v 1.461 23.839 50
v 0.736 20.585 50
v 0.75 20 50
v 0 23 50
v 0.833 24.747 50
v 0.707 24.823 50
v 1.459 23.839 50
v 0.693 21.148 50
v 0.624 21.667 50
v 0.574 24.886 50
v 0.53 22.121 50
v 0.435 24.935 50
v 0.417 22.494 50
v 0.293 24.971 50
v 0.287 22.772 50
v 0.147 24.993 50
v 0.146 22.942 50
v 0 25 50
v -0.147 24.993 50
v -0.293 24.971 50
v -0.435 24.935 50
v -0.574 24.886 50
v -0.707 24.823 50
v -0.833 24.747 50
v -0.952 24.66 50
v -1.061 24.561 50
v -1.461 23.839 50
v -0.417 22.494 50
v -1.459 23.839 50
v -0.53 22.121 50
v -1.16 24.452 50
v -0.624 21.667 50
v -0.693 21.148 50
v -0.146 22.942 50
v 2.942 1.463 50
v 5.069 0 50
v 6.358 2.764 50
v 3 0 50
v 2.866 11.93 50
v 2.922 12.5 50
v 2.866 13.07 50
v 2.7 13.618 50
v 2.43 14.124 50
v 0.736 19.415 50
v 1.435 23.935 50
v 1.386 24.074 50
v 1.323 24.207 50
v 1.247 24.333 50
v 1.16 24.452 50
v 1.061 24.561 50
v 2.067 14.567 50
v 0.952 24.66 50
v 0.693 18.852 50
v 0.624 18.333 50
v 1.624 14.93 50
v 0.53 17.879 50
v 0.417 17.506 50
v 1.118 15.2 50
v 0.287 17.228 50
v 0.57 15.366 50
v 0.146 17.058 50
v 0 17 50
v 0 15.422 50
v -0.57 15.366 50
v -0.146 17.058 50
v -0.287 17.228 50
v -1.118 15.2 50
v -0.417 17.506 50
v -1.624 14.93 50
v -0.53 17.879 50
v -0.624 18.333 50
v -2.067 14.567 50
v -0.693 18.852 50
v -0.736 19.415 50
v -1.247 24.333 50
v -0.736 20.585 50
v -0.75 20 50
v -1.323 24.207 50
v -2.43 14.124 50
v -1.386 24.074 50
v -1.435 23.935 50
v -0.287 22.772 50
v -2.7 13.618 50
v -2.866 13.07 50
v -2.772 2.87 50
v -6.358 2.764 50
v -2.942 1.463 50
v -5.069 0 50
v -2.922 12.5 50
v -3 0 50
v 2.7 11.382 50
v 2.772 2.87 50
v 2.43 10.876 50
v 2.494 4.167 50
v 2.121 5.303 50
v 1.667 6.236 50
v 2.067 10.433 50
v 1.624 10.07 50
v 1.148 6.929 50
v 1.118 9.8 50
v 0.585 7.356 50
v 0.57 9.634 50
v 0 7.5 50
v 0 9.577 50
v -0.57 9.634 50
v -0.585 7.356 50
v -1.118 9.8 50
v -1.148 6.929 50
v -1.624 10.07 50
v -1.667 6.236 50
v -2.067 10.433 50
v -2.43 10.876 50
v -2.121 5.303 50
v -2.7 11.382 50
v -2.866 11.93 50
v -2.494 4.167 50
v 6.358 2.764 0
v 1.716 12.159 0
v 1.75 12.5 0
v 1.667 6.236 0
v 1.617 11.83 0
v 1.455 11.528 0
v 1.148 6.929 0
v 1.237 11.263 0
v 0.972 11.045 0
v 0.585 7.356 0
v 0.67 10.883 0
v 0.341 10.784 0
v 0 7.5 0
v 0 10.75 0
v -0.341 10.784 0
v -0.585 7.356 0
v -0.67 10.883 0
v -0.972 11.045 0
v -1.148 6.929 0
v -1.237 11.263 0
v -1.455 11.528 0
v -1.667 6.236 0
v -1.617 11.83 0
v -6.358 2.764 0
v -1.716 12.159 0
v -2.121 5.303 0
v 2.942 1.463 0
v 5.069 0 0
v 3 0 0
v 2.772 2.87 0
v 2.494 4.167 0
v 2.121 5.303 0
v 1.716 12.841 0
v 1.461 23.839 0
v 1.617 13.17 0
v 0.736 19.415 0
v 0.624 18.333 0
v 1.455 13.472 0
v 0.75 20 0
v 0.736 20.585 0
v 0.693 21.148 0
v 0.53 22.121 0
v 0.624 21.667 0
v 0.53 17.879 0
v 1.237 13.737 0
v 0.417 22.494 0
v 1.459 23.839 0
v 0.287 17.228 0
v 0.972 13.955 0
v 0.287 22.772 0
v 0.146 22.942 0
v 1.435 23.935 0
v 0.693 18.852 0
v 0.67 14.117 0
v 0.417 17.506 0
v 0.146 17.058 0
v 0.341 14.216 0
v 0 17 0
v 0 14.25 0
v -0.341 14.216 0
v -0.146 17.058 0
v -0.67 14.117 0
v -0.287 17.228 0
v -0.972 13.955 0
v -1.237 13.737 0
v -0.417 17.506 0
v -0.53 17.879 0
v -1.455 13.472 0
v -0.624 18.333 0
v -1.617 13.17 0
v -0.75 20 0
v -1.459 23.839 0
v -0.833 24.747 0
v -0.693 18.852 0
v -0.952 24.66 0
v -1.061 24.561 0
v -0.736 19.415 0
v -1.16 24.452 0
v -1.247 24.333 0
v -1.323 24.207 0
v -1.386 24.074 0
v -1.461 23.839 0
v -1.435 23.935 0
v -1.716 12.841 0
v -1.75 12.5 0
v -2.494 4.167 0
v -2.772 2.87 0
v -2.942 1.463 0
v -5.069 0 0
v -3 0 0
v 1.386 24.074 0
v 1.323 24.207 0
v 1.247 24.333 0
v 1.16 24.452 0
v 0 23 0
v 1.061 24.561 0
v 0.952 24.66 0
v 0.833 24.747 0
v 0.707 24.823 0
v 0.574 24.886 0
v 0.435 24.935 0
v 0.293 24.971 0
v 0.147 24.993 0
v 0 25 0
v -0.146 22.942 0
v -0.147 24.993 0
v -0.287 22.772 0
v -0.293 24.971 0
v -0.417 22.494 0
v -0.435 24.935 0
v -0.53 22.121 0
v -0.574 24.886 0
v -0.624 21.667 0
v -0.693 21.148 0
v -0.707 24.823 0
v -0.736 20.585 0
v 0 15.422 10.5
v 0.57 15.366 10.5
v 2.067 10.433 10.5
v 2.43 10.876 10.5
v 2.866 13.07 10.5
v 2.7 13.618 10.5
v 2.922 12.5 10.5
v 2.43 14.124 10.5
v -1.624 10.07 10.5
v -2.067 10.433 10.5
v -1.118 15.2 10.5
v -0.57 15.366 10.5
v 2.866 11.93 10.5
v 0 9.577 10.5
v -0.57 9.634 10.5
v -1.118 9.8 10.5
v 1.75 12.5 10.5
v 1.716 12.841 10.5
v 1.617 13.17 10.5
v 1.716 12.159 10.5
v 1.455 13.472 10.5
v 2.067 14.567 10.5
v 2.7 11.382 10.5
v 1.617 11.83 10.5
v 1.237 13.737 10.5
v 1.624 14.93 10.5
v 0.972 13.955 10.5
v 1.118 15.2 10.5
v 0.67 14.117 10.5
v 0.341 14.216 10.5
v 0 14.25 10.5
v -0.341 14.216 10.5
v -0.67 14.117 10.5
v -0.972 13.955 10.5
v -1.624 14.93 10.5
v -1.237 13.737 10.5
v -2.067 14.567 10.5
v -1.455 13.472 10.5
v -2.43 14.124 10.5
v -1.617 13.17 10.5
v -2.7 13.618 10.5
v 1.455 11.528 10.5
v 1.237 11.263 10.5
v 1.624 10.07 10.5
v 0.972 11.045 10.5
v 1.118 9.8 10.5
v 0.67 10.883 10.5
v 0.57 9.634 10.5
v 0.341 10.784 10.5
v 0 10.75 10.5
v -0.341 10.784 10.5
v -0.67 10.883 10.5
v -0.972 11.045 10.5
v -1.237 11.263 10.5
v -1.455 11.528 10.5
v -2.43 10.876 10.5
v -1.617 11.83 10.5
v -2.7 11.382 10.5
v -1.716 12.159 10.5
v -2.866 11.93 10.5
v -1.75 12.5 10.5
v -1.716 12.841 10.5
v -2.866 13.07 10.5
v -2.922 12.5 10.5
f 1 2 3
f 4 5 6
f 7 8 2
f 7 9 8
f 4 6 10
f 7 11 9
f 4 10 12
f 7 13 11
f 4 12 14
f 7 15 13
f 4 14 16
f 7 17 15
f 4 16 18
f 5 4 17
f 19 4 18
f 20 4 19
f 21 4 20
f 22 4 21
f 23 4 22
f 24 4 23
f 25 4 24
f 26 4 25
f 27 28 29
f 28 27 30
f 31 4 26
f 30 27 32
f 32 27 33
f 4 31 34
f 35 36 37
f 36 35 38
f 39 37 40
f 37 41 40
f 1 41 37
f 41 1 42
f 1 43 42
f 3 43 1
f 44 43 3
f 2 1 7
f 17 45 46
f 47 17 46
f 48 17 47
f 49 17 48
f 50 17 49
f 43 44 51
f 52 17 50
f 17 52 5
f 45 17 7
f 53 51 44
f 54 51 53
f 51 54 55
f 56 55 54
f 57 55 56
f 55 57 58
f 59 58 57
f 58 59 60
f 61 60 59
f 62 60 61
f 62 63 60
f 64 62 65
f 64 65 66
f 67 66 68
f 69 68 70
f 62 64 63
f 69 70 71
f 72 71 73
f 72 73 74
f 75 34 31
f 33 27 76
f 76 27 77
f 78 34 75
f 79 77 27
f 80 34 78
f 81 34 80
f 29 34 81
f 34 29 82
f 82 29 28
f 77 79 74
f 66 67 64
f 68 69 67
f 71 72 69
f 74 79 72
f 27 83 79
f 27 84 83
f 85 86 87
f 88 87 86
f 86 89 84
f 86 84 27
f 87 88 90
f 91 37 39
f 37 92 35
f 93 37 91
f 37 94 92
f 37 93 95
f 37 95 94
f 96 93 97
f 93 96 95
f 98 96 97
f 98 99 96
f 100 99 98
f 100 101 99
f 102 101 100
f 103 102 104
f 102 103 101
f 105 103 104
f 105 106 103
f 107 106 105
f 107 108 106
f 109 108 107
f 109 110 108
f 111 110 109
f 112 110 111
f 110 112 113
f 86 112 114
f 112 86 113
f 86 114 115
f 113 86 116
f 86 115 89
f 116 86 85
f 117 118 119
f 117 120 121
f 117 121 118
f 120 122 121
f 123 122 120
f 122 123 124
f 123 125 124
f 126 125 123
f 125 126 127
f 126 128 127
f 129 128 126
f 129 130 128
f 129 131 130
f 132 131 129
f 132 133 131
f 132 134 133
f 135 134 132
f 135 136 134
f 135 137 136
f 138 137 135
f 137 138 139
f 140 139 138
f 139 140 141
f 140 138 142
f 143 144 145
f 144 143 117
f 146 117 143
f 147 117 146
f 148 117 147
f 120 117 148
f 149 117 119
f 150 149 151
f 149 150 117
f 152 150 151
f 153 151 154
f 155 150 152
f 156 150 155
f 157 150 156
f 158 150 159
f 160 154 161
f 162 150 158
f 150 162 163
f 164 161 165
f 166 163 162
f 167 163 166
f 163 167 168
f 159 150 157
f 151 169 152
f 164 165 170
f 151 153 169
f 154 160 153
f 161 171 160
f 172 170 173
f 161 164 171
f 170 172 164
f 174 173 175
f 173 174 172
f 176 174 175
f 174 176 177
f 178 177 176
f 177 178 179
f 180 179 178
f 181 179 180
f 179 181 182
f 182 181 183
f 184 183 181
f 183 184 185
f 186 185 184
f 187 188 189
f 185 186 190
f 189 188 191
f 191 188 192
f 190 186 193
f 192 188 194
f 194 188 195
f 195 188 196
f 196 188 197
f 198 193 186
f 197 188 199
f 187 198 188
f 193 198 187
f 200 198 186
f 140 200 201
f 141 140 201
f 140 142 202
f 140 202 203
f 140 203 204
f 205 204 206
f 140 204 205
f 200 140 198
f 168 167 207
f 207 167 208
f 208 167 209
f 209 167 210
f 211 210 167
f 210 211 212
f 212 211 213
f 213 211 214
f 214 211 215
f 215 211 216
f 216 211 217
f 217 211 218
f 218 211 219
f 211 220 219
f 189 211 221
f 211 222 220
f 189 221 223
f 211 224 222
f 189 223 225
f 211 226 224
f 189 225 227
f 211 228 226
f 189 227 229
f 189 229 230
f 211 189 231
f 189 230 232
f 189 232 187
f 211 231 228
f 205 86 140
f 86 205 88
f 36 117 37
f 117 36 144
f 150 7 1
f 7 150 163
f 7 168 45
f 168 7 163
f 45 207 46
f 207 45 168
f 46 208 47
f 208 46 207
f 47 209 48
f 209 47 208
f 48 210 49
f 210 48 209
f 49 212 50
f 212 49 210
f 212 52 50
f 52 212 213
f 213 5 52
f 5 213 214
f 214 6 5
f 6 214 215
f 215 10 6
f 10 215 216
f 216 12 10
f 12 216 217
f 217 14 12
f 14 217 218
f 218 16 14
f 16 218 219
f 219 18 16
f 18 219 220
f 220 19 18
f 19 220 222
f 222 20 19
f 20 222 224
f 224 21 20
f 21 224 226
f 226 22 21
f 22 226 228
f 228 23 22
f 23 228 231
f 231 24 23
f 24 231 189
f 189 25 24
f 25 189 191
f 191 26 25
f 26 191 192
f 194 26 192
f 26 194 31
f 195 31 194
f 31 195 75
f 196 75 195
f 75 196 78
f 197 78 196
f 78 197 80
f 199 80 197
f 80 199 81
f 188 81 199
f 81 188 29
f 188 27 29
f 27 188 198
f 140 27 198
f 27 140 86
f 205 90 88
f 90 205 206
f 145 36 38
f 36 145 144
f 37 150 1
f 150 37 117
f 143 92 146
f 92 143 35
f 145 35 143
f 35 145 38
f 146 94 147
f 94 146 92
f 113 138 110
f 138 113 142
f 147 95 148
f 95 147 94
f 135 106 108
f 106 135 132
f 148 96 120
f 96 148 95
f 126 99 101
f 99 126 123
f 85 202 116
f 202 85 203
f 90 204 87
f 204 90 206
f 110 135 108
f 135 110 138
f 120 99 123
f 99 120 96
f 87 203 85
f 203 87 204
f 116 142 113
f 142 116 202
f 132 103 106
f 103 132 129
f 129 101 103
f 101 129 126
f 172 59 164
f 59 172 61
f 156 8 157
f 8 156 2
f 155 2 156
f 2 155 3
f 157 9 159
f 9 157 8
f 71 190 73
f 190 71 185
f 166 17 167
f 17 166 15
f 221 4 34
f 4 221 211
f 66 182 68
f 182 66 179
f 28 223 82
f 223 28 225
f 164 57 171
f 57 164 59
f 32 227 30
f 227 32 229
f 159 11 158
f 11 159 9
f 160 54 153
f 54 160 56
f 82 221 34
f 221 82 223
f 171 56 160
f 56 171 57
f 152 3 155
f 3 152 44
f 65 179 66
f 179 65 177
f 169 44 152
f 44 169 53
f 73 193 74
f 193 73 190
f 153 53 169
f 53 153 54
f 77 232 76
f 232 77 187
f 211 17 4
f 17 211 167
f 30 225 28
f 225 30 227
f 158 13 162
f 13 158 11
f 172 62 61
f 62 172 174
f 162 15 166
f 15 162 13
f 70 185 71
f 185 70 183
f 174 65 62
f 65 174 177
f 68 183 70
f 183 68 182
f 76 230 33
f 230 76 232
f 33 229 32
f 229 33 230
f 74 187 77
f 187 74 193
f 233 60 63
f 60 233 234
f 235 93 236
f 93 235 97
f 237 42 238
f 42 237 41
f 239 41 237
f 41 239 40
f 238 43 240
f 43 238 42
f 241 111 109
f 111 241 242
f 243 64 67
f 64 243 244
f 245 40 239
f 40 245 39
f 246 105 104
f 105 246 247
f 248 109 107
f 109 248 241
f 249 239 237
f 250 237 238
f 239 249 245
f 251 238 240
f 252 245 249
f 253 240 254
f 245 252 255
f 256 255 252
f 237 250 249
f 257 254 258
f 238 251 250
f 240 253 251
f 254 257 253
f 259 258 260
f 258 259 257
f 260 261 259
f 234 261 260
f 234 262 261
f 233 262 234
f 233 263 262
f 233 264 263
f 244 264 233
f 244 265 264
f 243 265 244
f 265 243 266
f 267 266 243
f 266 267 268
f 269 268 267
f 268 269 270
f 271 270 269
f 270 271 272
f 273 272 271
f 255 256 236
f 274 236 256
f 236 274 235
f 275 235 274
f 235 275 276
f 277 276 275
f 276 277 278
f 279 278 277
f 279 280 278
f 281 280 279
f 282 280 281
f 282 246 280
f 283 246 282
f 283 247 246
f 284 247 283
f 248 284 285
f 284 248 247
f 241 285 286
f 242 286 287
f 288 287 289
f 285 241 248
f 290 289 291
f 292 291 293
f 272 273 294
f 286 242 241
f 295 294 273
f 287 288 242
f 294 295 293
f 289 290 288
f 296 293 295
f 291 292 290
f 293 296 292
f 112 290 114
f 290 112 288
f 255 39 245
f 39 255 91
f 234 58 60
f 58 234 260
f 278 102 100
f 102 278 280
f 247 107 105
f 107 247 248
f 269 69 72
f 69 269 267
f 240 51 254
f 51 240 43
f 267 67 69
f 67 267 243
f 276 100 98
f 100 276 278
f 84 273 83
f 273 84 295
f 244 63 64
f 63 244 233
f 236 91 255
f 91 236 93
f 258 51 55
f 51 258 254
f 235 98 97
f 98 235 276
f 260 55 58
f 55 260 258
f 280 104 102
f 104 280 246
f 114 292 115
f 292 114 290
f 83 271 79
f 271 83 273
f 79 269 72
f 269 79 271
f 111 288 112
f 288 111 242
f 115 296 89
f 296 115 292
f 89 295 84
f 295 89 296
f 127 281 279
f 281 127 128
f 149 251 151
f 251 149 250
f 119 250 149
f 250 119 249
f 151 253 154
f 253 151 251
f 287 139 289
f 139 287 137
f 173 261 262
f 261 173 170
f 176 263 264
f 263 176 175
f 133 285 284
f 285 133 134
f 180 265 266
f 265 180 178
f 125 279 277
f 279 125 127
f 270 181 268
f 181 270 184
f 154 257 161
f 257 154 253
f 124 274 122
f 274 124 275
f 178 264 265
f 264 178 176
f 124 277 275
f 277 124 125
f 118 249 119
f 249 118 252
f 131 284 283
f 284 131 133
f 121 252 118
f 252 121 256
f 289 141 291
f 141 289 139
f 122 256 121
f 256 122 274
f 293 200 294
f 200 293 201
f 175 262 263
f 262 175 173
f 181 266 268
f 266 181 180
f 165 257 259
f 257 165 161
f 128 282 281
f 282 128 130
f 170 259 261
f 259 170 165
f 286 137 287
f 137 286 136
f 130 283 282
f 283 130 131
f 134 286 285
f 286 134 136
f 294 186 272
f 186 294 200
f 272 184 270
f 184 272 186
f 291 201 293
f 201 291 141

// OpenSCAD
// file: rounded_triangle.scad
// rounded_triangle.scad — modularized, mathematically tangent version
// -------------------------------------------------------------

$fn = 64; // Smoothness of circles

// =============================================================
// Modules
// =============================================================

// Main module: triangle with smooth semicircular tip
module rounded_triangle(base, height, tip_dia) {
    r = tip_dia / 2;
    circle_center = [base / 2, height - r];

    // Compute tangent points to ensure perfect tangency
    T_left = tangent_point(circle_center, r, [0, 0], +1);
    T_right = tangent_point(circle_center, r, [base, 0], -1);

    union() {
        polygon(points=[[0, 0], [base, 0], T_right, T_left]);
        translate(circle_center)
            circle(r=r);
    }
}

// Utility: find tangent point on circle from external point
// side = +1 (left tangent), -1 (right tangent)
function tangent_point(center, radius, ext_point, side = 1) =
    let (
        v = center - ext_point,
        L = norm(v),
        s = radius / L,
        a = sqrt(L * L - radius * radius),
        c = a / L,
        rot = [
            [c, -side * s],
            [side * s, c],
        ]
    ) ext_point + rot * (a * (v / L));

// =============================================================
// Parameters
// =============================================================
triangle_height = 23;
triangle_base = 11;
tip_diameter = 2;

// =============================================================
// Main build
// =============================================================
rounded_triangle(triangle_base, triangle_height, tip_diameter);
// main file
use <rounded_triangle.scad>

$fn = $preview ? 32 : 64; // Smoothness of circles
z_fight = $preview ? 0.05 : 0; // Small offset to prevent z-fighting in preview mode

// =============================================================
// Parameters
// =============================================================
triangle_height = 25;
triangle_base = 14;
tip_diameter = 3;

length = 50;

screw_diameter = 3.5;

// =============================================================
// Main build
// =============================================================
difference() {
    // Extrude a rounded triangle
    translate([-triangle_base / 2, 0, 0])
        linear_extrude(height=length)
            rounded_triangle(triangle_base, triangle_height, tip_diameter);

    // Chamfer the bottom edges
    for (i = [0:1])
        mirror([i, 0, 0])
            translate([-triangle_base / 2, 0, length / 2])
                rotate([0, 0, 25])
                    cube([triangle_base / 4, triangle_base / 2, length + z_fight], center=true);

    // Mass cut off at the bottom to reduce material use
    translate([0, 0, length / 2])
        scale([1, 2.5, 1])
            cylinder(h=length + z_fight, d=tip_diameter * 2, center=true, $fn=32);

    // Mass cut off at the bottom to reduce material use
    translate([0, triangle_height * 0.8, length / 2])
        scale([0.5, 2, 1])
            cylinder(h=length + z_fight, d=tip_diameter, center=true, $fn=32);

    // Head bore
    translate([0, triangle_height / 2, length / 2 + screw_diameter * 3])
        cylinder(h=length + z_fight, d=screw_diameter * 1.67, center=true, $fn=32);

    // Screw hole
    translate([0, triangle_height / 2, length / 2])
        cylinder(h=length + z_fight, d=screw_diameter, center=true, $fn=32);
}
